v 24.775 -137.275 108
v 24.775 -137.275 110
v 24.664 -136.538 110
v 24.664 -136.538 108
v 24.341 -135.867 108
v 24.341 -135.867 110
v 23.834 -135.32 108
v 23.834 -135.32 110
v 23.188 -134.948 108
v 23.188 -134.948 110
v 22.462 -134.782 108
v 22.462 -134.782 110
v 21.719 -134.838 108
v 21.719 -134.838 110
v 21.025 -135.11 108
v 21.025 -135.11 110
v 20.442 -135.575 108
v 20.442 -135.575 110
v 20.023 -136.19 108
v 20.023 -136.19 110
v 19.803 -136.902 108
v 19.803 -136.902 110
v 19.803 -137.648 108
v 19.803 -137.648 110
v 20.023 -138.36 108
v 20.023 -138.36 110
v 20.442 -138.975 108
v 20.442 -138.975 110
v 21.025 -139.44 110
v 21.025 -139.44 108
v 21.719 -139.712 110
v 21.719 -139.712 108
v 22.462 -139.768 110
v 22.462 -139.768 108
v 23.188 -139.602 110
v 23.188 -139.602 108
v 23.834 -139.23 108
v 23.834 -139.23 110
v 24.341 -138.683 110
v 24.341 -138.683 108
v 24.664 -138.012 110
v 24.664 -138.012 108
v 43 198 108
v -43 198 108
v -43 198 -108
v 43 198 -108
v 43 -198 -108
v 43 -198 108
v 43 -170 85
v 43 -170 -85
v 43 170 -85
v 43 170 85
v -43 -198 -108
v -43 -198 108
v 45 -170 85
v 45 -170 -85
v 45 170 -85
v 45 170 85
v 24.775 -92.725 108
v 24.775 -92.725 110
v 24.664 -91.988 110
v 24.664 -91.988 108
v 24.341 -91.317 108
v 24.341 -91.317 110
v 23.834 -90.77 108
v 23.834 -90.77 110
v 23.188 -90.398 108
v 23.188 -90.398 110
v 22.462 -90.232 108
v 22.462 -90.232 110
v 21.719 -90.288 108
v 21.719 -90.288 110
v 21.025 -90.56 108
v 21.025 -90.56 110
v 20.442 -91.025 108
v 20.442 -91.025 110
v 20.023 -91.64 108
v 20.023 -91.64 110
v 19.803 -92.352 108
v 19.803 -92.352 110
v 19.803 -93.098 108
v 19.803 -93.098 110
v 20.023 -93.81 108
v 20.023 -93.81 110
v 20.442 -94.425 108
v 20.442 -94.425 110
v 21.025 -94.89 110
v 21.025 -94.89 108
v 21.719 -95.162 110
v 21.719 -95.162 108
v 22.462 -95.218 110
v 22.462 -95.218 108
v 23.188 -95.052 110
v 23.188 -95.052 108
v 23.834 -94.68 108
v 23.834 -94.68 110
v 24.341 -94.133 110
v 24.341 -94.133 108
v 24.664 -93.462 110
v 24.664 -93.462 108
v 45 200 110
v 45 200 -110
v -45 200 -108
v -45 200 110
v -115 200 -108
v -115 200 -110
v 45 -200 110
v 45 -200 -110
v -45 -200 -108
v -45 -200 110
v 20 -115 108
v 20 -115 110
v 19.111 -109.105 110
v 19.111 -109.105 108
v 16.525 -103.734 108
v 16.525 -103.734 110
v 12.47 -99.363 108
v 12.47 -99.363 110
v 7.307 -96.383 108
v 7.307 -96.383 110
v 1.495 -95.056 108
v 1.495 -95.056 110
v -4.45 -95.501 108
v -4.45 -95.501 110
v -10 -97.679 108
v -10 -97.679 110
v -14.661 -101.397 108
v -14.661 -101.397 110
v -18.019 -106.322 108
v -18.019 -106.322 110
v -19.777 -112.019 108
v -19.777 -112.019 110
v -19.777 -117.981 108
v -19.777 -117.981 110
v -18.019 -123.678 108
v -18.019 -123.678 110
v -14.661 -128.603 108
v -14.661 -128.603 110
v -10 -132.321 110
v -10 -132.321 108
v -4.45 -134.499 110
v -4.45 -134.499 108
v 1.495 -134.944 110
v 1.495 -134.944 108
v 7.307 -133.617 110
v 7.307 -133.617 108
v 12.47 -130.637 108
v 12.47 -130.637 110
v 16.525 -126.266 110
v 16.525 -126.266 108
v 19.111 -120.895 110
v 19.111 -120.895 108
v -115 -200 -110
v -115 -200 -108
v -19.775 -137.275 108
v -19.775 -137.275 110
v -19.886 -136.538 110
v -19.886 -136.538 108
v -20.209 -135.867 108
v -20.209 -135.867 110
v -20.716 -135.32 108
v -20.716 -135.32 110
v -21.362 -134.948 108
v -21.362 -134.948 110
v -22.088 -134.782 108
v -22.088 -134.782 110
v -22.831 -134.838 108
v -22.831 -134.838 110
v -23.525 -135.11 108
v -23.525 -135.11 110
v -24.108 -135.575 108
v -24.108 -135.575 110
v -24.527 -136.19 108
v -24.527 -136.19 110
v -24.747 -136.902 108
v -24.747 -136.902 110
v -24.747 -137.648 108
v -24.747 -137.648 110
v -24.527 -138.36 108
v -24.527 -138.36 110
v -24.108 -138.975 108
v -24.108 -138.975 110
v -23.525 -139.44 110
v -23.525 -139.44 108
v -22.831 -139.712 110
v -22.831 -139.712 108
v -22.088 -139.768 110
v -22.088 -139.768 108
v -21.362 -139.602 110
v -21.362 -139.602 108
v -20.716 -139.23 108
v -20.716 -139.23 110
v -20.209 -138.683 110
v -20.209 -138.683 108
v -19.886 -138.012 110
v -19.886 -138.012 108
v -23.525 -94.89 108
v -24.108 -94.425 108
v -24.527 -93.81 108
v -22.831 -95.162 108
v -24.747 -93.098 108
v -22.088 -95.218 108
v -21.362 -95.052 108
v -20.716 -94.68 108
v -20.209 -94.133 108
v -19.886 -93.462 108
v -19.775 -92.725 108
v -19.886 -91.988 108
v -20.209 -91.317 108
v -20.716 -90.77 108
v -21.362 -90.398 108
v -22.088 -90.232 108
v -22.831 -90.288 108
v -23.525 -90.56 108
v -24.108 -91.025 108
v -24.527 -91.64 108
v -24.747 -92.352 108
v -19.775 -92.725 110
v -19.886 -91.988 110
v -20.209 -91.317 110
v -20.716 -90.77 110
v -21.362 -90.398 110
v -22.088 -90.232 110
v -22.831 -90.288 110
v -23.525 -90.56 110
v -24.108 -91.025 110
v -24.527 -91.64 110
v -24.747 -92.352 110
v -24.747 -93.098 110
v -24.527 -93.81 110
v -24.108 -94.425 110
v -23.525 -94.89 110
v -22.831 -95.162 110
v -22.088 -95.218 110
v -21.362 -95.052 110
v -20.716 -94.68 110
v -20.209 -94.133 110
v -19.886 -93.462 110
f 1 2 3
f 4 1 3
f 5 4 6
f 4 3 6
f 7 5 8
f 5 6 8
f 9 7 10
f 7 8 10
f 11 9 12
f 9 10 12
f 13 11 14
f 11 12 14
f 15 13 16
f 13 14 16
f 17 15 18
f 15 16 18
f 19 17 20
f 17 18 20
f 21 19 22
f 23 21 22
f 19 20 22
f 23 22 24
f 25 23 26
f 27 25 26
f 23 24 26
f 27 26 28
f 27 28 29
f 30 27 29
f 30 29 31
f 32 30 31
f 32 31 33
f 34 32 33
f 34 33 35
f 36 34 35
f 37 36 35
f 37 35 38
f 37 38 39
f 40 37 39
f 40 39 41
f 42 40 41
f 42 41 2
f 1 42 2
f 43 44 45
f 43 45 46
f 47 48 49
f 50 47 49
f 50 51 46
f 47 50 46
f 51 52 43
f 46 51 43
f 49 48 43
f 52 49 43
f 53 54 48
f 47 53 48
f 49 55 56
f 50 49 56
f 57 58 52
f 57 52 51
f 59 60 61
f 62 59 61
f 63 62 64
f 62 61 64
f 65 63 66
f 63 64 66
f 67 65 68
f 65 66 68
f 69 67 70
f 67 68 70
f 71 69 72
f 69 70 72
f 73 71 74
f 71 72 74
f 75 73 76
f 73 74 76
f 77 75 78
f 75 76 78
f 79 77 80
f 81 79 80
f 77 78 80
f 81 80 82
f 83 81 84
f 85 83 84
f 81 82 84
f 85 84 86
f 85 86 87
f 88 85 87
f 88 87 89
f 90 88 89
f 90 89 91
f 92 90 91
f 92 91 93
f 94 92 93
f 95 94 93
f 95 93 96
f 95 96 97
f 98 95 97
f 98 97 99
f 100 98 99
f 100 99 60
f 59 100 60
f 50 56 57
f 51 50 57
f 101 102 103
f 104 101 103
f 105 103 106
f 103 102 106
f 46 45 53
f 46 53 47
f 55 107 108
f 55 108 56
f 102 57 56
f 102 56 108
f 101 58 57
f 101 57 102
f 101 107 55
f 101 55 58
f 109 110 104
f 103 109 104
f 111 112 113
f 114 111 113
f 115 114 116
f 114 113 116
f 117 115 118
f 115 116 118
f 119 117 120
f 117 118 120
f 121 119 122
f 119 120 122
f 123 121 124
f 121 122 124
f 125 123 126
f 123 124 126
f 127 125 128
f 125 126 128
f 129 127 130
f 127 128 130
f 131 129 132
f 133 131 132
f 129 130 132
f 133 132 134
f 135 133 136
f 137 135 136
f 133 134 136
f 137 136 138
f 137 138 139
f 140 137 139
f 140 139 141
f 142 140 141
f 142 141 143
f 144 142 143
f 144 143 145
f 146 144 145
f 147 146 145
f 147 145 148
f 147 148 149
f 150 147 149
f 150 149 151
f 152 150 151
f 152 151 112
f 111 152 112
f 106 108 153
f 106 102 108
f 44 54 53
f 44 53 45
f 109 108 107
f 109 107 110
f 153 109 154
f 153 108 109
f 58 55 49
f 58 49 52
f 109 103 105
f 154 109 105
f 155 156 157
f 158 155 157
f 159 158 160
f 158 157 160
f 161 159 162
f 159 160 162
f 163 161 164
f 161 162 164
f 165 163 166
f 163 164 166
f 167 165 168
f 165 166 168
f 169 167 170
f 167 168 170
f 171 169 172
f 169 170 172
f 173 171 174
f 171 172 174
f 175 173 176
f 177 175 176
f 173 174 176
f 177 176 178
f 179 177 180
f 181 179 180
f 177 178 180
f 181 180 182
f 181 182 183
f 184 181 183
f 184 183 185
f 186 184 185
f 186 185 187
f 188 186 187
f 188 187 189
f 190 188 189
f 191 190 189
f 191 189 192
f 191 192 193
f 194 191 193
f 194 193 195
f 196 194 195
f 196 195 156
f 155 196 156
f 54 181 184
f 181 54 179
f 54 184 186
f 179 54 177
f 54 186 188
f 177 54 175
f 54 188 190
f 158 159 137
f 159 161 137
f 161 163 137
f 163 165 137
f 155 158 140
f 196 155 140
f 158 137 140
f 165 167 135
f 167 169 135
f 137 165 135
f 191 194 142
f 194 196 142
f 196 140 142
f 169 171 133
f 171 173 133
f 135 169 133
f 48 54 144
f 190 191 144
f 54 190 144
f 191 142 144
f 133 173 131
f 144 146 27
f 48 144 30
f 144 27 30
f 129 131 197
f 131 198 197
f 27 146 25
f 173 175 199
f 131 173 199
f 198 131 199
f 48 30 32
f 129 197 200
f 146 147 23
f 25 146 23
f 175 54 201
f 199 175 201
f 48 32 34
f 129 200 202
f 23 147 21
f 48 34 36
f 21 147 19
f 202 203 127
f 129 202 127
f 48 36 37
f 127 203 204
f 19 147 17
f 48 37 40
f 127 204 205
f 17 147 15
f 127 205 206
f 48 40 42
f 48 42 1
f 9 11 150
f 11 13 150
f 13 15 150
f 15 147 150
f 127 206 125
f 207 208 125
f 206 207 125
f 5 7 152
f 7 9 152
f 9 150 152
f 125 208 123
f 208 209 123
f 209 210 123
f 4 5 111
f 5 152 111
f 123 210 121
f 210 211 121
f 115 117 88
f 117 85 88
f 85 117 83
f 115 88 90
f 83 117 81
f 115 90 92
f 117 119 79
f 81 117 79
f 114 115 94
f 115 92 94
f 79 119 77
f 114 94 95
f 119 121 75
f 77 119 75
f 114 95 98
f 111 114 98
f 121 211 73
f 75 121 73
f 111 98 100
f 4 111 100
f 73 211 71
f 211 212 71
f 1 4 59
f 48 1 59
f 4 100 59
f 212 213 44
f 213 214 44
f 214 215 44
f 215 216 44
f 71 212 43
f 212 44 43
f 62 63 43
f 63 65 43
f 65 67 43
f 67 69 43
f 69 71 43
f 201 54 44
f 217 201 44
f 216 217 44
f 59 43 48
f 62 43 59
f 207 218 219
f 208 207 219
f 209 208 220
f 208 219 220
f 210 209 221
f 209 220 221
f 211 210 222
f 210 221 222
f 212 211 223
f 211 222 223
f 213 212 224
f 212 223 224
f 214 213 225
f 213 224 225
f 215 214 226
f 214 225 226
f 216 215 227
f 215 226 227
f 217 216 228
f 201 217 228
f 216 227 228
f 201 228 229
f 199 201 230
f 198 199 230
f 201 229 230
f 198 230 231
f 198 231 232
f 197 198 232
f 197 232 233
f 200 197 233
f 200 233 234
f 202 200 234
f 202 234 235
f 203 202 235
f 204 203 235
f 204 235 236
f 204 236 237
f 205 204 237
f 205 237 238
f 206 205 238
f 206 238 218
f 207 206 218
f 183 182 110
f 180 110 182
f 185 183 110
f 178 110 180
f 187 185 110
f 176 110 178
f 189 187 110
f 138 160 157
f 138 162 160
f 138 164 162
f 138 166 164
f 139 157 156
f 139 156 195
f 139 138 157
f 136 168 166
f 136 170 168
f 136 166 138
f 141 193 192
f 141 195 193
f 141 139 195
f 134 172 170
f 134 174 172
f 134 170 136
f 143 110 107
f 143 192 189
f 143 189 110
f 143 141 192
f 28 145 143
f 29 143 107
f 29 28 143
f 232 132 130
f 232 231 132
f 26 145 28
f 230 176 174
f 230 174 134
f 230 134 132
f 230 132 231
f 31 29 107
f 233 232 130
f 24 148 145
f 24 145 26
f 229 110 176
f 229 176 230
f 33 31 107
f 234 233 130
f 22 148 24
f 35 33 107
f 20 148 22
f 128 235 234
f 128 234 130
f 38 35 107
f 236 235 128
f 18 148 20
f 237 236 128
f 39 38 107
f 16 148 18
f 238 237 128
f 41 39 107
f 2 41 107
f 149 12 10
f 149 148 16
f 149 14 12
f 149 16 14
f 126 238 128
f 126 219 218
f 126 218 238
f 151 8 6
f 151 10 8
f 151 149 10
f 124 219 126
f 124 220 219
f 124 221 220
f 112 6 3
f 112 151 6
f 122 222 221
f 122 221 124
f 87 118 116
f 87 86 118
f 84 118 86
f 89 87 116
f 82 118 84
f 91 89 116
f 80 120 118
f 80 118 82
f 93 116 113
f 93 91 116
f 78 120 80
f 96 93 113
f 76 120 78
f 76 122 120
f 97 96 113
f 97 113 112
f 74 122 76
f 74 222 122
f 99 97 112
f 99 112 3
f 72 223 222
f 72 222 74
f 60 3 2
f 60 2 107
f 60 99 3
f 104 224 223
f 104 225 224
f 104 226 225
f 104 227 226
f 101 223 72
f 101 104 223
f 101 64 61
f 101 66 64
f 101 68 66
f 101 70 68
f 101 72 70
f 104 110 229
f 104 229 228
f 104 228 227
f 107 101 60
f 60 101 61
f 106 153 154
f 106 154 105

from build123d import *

# Parameters (mm, degrees)
SKETCH1_W           = 90
SKETCH1_H           = 400
BOSS_EXTRUDE1_DEPTH = 110
SHELL1_T            = 2
CUT_EXTRUDE2_REACH  = 247.357
SKETCH2_W           = 170
SKETCH2_H           = 340
CUT_EXTRUDE3_REACH  = 302.707
SKETCH5_R           = 20
SKETCH5_R_2         = 2.5
SKETCH6_W           = 70
SKETCH6_H           = 400
BOSS_EXTRUDE2_DEPTH = 2


with BuildPart() as part:
    # Sketch1 → Boss-Extrude1 (new, symmetric)
    with BuildSketch(Plane.XY):
        Rectangle(SKETCH1_W, SKETCH1_H)
    extrude(amount=BOSS_EXTRUDE1_DEPTH, both=True)

    # Shell1 (no face opened: a closed hollow body)
    add(offset(amount=-SHELL1_T, mode=Mode.PRIVATE), mode=Mode.SUBTRACT)

    # Sketch2 → Cut-Extrude2 (cut, up to next)
    with BuildSketch(Plane(origin=(45, 0, 0), x_dir=(0, 0, -1), z_dir=(1, 0, 0)), mode=Mode.PRIVATE) as cut_extrude2_sk1:
        Rectangle(SKETCH2_W, SKETCH2_H)
    cut_extrude2_tool1 = extrude(cut_extrude2_sk1.sketch, amount=-CUT_EXTRUDE2_REACH, mode=Mode.PRIVATE) & part.part
    add(cut_extrude2_tool1.solids().sort_by_distance((45, 0, 0))[0], mode=Mode.SUBTRACT)

    # Sketch5 → Cut-Extrude3 (cut, up to next)
    with BuildSketch(Plane.XY.offset(110), mode=Mode.PRIVATE) as cut_extrude3_sk1:
        with Locations((0, -115)):
            Circle(SKETCH5_R)
    cut_extrude3_tool1 = extrude(cut_extrude3_sk1.sketch, amount=-CUT_EXTRUDE3_REACH, mode=Mode.PRIVATE) & part.part
    # Sketch5 → Cut-Extrude3 (cut, up to next)
    with BuildSketch(Plane.XY.offset(110), mode=Mode.PRIVATE) as cut_extrude3_sk2:
        with Locations((-22.275, -92.725)):
            Circle(SKETCH5_R_2)
    cut_extrude3_tool2 = extrude(cut_extrude3_sk2.sketch, amount=-CUT_EXTRUDE3_REACH, mode=Mode.PRIVATE) & part.part
    # Sketch5 → Cut-Extrude3 (cut, up to next)
    with BuildSketch(Plane.XY.offset(110), mode=Mode.PRIVATE) as cut_extrude3_sk3:
        with Locations((22.275, -92.725)):
            Circle(SKETCH5_R_2)
    cut_extrude3_tool3 = extrude(cut_extrude3_sk3.sketch, amount=-CUT_EXTRUDE3_REACH, mode=Mode.PRIVATE) & part.part
    # Sketch5 → Cut-Extrude3 (cut, up to next)
    with BuildSketch(Plane.XY.offset(110), mode=Mode.PRIVATE) as cut_extrude3_sk4:
        with Locations((-22.275, -137.275)):
            Circle(SKETCH5_R_2)
    cut_extrude3_tool4 = extrude(cut_extrude3_sk4.sketch, amount=-CUT_EXTRUDE3_REACH, mode=Mode.PRIVATE) & part.part
    # Sketch5 → Cut-Extrude3 (cut, up to next)
    with BuildSketch(Plane.XY.offset(110), mode=Mode.PRIVATE) as cut_extrude3_sk5:
        with Locations((22.275, -137.275)):
            Circle(SKETCH5_R_2)
    cut_extrude3_tool5 = extrude(cut_extrude3_sk5.sketch, amount=-CUT_EXTRUDE3_REACH, mode=Mode.PRIVATE) & part.part
    add(cut_extrude3_tool1.solids().sort_by_distance((0, -115, 110))[0], mode=Mode.SUBTRACT)
    add(cut_extrude3_tool2.solids().sort_by_distance((-22.275, -92.725, 110))[0], mode=Mode.SUBTRACT)
    add(cut_extrude3_tool3.solids().sort_by_distance((22.275, -92.725, 110))[0], mode=Mode.SUBTRACT)
    add(cut_extrude3_tool4.solids().sort_by_distance((-22.275, -137.275, 110))[0], mode=Mode.SUBTRACT)
    add(cut_extrude3_tool5.solids().sort_by_distance((22.275, -137.275, 110))[0], mode=Mode.SUBTRACT)

    # Sketch6 → Boss-Extrude2 (add)
    with BuildSketch(Plane(origin=(0, 0, -110), x_dir=(-1, 0, 0), z_dir=(0, 0, -1))):
        with Locations((80, 0)):
            Rectangle(SKETCH6_W, SKETCH6_H)
    extrude(amount=-BOSS_EXTRUDE2_DEPTH)


solid = part.part
